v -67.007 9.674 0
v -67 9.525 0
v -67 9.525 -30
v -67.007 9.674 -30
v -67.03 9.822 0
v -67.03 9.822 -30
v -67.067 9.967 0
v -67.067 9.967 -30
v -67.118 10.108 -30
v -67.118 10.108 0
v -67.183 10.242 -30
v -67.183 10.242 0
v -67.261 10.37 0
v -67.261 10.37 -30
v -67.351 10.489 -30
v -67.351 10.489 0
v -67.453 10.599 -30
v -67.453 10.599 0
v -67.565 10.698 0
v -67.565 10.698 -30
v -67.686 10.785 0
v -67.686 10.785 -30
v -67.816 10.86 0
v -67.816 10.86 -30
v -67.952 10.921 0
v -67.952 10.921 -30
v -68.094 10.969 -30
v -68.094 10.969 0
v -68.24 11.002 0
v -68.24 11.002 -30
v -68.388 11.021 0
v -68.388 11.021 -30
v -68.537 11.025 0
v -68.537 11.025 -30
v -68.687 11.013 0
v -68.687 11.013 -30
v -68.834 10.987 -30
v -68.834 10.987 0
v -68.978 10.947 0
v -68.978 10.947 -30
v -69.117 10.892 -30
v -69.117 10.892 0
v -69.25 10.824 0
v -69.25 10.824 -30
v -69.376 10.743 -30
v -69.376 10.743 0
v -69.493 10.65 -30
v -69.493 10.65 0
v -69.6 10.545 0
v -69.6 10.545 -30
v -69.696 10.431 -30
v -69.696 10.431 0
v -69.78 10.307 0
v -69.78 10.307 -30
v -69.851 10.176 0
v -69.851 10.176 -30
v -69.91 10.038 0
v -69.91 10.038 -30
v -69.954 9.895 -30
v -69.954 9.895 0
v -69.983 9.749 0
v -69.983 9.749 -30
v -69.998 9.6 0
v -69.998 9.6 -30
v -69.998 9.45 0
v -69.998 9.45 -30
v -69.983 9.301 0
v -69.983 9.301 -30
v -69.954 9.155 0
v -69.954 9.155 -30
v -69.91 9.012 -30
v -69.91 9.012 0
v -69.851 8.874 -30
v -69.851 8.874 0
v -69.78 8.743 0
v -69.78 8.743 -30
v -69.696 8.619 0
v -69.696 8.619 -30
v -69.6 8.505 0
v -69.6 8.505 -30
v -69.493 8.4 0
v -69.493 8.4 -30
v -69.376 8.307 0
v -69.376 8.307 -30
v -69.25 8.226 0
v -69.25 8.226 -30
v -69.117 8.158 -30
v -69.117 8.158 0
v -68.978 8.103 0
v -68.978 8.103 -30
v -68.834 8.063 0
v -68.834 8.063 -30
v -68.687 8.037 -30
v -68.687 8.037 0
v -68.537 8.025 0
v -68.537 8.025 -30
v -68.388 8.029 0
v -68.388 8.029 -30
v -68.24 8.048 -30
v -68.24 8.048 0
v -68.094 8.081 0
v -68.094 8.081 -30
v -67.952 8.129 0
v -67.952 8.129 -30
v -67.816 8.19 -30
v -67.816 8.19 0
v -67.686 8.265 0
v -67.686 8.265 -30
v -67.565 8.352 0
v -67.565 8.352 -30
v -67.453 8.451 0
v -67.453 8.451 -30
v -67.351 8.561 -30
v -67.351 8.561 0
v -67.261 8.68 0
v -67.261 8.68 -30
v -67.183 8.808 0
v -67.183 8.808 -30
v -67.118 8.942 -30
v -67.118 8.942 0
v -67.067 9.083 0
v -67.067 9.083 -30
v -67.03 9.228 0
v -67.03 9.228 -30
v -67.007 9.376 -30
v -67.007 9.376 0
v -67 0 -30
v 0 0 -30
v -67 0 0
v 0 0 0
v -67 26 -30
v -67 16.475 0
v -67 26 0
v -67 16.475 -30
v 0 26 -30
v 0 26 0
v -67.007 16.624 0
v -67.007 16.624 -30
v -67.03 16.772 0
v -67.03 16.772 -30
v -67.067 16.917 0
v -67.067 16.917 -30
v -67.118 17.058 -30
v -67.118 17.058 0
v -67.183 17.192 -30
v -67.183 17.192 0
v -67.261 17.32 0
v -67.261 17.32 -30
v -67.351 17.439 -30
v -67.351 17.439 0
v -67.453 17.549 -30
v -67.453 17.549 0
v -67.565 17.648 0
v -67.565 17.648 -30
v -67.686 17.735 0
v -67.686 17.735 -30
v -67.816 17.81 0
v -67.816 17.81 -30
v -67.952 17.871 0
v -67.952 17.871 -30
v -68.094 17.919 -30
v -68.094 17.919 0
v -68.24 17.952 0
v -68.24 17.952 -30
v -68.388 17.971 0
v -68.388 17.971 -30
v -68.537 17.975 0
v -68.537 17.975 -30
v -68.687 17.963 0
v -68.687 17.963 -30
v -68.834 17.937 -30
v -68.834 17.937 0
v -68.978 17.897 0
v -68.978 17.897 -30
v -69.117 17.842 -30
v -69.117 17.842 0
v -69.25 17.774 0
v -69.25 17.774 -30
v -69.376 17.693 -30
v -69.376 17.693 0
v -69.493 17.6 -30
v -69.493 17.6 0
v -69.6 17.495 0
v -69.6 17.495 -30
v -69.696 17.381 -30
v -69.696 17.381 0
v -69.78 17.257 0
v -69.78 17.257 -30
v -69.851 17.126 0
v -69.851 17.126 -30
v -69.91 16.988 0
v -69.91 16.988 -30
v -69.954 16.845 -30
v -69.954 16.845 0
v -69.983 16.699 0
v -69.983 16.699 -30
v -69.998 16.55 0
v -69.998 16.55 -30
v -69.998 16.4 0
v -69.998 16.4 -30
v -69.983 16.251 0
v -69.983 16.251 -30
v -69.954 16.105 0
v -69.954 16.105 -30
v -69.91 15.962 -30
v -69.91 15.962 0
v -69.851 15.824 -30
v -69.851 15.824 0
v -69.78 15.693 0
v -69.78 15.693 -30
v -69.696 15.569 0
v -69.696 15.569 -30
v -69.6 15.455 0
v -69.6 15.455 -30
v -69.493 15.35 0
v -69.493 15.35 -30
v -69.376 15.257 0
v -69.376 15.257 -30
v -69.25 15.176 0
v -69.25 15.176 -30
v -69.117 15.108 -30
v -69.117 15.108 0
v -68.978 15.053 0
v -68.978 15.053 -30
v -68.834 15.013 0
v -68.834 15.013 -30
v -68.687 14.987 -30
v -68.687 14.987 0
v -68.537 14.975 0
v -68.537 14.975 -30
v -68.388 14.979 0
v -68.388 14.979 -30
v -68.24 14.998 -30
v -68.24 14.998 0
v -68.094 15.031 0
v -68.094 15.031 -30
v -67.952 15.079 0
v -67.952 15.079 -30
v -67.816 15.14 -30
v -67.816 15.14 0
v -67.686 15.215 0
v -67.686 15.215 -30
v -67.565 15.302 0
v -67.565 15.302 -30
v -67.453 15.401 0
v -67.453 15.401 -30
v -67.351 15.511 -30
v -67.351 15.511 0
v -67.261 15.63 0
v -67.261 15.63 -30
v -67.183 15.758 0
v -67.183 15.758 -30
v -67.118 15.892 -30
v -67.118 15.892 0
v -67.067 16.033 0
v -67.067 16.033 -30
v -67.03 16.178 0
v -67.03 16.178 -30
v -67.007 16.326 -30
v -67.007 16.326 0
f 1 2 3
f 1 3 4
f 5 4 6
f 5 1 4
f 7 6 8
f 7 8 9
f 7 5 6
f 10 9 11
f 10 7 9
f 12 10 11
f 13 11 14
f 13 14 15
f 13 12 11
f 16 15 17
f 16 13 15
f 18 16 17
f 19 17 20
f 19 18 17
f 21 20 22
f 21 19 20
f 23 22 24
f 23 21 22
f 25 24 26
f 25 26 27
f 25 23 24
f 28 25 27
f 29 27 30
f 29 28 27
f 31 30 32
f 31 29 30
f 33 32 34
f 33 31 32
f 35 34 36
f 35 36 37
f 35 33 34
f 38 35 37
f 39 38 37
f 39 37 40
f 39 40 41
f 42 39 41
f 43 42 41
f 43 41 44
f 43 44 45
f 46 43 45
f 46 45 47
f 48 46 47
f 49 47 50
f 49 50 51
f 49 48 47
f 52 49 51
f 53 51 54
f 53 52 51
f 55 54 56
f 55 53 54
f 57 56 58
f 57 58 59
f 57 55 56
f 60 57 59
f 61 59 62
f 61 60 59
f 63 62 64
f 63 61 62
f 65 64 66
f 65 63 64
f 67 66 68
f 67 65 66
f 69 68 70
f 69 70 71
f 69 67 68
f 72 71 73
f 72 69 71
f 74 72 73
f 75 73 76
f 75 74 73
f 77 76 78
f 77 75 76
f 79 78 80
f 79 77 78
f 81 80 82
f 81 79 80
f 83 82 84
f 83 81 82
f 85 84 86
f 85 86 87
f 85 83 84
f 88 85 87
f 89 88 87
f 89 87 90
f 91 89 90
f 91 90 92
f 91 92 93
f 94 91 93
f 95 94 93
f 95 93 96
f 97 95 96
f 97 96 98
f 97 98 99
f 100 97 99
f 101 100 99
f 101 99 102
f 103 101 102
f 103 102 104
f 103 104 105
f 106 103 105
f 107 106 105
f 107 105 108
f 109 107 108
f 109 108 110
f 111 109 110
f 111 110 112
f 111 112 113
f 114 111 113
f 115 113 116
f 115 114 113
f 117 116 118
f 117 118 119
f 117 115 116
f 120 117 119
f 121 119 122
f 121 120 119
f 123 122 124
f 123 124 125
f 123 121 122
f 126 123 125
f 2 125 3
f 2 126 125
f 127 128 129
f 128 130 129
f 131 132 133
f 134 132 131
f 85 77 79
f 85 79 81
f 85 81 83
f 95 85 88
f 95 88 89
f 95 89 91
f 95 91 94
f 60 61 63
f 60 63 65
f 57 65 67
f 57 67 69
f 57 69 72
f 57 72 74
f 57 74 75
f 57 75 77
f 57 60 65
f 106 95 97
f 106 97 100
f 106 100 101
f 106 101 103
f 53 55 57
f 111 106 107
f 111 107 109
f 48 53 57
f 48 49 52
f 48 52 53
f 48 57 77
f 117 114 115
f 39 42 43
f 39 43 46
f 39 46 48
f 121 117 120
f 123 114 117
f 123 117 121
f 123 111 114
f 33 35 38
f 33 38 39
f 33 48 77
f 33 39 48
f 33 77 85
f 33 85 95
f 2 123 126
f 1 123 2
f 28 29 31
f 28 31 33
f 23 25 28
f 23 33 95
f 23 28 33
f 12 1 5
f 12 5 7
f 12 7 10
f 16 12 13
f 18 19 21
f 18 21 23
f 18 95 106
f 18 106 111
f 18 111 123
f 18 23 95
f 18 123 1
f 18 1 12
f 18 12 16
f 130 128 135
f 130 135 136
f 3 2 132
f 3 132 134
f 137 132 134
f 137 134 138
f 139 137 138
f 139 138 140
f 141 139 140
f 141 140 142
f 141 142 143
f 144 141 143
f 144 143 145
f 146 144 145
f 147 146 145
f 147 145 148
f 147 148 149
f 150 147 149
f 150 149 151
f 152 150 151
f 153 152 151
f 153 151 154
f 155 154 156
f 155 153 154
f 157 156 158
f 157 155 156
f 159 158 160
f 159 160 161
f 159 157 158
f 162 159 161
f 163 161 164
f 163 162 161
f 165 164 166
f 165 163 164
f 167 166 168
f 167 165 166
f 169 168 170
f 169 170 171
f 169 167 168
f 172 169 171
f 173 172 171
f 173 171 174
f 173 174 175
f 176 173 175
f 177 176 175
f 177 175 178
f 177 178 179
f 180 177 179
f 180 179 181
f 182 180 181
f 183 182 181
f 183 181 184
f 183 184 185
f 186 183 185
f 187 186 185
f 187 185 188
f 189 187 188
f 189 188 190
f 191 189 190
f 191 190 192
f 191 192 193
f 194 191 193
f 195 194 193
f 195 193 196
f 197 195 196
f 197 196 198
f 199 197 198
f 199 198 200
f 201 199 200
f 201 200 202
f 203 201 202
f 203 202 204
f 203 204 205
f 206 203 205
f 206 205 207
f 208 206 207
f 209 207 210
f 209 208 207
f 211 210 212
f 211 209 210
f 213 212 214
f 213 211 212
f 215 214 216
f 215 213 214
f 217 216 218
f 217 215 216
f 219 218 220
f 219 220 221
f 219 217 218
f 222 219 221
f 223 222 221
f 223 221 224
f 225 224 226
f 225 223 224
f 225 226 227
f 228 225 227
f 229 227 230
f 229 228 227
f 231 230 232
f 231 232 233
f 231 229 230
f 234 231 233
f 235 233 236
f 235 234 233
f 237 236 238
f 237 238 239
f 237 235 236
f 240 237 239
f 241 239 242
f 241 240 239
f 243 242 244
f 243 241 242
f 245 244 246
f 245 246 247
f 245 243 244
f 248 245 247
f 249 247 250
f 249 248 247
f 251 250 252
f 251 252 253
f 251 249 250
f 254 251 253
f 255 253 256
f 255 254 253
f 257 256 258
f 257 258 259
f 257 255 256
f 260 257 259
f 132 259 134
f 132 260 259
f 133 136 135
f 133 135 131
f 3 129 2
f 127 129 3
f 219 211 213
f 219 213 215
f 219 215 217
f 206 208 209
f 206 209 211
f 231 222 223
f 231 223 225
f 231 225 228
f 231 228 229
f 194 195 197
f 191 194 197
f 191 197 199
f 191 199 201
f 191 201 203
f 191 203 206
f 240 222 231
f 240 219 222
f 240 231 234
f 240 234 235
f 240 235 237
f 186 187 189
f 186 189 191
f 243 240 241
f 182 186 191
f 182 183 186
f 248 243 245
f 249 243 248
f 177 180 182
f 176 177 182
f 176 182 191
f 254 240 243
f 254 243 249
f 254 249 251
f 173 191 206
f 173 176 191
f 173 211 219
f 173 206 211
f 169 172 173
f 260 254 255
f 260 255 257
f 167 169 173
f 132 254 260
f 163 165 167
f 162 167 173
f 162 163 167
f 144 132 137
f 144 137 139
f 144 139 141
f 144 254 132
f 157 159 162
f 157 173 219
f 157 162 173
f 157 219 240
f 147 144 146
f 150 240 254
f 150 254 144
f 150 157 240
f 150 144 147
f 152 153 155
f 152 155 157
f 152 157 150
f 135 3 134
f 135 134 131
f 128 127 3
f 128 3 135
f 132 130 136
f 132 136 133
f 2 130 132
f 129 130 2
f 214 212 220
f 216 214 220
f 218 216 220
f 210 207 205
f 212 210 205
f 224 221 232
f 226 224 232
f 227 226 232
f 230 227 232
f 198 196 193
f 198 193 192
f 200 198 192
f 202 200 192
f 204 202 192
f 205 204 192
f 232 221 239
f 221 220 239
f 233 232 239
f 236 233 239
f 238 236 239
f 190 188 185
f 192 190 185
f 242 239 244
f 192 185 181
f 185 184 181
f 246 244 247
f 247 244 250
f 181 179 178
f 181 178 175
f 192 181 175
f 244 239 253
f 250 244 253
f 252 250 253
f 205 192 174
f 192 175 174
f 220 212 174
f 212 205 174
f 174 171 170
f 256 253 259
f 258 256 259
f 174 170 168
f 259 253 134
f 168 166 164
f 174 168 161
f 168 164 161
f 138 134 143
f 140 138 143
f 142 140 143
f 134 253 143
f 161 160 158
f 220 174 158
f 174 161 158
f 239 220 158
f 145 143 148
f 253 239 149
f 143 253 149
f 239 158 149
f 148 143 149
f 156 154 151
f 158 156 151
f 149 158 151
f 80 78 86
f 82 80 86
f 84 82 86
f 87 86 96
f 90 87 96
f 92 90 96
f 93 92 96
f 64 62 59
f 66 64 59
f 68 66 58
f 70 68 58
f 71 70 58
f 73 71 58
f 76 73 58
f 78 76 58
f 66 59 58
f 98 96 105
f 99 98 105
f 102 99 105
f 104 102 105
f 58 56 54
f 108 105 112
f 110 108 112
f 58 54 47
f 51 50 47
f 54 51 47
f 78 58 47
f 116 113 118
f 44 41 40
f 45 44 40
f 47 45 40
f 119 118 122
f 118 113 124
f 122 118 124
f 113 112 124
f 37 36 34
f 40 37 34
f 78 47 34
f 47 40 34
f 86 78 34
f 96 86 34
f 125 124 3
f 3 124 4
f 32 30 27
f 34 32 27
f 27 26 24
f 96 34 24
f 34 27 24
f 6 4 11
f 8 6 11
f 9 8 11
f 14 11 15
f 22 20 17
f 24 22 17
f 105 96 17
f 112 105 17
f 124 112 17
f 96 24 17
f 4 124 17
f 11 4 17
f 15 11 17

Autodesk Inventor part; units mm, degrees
ref_plane "YZ Plane" through (0, 0, 0) normal (1, 0, 0) x (0, 1, 0)
ref_plane "XZ Plane" through (0, 0, 0) normal (0, 1, 0) x (-1, 0, 0)
ref_plane "XY Plane" through (0, 0, 0) normal (0, 0, 1) x (1, 0, 0)
sketch "Sketch1" plane through (0, 0, 0) normal (0, 1, 0) x (-1, 0, 0)
  line L0 (0, 0) -> (67, 0)
  line L1 (67, 0) -> (67, -30)
  line L2 (67, -30) -> (0, -30)
  line L3 (0, -30) -> (0, 0)
  dimension "d0" = 67
  dimension "d1" = 30
extrude "Extrusion1" add sketch "Sketch1" along normal blind 26
sketch "Sketch2" plane through (-67, 0, 0) normal (0, 0, 1) x (1, 0, 0)
  circle A0 centre (-1.5, 16.475) radius 1.5
  line L0 (0, 0) -> (0, 26) projected
  line L1 (0, 26) -> (67, 26) projected
  line L2 (0, 0) -> (0, 26) projected
  line L3 (0, 13) -> (5.0993, 13) construction
  circle A1 centre (-1.5, 9.525) radius 1.5
  point P0 (67, 0)
  dimension "d4" = 3
  dimension "d5" = 9.525
extrude "Extrusion2" add sketch "Sketch2" against normal up to surface (30 mm away)
properties part number "Temp - Battery"
